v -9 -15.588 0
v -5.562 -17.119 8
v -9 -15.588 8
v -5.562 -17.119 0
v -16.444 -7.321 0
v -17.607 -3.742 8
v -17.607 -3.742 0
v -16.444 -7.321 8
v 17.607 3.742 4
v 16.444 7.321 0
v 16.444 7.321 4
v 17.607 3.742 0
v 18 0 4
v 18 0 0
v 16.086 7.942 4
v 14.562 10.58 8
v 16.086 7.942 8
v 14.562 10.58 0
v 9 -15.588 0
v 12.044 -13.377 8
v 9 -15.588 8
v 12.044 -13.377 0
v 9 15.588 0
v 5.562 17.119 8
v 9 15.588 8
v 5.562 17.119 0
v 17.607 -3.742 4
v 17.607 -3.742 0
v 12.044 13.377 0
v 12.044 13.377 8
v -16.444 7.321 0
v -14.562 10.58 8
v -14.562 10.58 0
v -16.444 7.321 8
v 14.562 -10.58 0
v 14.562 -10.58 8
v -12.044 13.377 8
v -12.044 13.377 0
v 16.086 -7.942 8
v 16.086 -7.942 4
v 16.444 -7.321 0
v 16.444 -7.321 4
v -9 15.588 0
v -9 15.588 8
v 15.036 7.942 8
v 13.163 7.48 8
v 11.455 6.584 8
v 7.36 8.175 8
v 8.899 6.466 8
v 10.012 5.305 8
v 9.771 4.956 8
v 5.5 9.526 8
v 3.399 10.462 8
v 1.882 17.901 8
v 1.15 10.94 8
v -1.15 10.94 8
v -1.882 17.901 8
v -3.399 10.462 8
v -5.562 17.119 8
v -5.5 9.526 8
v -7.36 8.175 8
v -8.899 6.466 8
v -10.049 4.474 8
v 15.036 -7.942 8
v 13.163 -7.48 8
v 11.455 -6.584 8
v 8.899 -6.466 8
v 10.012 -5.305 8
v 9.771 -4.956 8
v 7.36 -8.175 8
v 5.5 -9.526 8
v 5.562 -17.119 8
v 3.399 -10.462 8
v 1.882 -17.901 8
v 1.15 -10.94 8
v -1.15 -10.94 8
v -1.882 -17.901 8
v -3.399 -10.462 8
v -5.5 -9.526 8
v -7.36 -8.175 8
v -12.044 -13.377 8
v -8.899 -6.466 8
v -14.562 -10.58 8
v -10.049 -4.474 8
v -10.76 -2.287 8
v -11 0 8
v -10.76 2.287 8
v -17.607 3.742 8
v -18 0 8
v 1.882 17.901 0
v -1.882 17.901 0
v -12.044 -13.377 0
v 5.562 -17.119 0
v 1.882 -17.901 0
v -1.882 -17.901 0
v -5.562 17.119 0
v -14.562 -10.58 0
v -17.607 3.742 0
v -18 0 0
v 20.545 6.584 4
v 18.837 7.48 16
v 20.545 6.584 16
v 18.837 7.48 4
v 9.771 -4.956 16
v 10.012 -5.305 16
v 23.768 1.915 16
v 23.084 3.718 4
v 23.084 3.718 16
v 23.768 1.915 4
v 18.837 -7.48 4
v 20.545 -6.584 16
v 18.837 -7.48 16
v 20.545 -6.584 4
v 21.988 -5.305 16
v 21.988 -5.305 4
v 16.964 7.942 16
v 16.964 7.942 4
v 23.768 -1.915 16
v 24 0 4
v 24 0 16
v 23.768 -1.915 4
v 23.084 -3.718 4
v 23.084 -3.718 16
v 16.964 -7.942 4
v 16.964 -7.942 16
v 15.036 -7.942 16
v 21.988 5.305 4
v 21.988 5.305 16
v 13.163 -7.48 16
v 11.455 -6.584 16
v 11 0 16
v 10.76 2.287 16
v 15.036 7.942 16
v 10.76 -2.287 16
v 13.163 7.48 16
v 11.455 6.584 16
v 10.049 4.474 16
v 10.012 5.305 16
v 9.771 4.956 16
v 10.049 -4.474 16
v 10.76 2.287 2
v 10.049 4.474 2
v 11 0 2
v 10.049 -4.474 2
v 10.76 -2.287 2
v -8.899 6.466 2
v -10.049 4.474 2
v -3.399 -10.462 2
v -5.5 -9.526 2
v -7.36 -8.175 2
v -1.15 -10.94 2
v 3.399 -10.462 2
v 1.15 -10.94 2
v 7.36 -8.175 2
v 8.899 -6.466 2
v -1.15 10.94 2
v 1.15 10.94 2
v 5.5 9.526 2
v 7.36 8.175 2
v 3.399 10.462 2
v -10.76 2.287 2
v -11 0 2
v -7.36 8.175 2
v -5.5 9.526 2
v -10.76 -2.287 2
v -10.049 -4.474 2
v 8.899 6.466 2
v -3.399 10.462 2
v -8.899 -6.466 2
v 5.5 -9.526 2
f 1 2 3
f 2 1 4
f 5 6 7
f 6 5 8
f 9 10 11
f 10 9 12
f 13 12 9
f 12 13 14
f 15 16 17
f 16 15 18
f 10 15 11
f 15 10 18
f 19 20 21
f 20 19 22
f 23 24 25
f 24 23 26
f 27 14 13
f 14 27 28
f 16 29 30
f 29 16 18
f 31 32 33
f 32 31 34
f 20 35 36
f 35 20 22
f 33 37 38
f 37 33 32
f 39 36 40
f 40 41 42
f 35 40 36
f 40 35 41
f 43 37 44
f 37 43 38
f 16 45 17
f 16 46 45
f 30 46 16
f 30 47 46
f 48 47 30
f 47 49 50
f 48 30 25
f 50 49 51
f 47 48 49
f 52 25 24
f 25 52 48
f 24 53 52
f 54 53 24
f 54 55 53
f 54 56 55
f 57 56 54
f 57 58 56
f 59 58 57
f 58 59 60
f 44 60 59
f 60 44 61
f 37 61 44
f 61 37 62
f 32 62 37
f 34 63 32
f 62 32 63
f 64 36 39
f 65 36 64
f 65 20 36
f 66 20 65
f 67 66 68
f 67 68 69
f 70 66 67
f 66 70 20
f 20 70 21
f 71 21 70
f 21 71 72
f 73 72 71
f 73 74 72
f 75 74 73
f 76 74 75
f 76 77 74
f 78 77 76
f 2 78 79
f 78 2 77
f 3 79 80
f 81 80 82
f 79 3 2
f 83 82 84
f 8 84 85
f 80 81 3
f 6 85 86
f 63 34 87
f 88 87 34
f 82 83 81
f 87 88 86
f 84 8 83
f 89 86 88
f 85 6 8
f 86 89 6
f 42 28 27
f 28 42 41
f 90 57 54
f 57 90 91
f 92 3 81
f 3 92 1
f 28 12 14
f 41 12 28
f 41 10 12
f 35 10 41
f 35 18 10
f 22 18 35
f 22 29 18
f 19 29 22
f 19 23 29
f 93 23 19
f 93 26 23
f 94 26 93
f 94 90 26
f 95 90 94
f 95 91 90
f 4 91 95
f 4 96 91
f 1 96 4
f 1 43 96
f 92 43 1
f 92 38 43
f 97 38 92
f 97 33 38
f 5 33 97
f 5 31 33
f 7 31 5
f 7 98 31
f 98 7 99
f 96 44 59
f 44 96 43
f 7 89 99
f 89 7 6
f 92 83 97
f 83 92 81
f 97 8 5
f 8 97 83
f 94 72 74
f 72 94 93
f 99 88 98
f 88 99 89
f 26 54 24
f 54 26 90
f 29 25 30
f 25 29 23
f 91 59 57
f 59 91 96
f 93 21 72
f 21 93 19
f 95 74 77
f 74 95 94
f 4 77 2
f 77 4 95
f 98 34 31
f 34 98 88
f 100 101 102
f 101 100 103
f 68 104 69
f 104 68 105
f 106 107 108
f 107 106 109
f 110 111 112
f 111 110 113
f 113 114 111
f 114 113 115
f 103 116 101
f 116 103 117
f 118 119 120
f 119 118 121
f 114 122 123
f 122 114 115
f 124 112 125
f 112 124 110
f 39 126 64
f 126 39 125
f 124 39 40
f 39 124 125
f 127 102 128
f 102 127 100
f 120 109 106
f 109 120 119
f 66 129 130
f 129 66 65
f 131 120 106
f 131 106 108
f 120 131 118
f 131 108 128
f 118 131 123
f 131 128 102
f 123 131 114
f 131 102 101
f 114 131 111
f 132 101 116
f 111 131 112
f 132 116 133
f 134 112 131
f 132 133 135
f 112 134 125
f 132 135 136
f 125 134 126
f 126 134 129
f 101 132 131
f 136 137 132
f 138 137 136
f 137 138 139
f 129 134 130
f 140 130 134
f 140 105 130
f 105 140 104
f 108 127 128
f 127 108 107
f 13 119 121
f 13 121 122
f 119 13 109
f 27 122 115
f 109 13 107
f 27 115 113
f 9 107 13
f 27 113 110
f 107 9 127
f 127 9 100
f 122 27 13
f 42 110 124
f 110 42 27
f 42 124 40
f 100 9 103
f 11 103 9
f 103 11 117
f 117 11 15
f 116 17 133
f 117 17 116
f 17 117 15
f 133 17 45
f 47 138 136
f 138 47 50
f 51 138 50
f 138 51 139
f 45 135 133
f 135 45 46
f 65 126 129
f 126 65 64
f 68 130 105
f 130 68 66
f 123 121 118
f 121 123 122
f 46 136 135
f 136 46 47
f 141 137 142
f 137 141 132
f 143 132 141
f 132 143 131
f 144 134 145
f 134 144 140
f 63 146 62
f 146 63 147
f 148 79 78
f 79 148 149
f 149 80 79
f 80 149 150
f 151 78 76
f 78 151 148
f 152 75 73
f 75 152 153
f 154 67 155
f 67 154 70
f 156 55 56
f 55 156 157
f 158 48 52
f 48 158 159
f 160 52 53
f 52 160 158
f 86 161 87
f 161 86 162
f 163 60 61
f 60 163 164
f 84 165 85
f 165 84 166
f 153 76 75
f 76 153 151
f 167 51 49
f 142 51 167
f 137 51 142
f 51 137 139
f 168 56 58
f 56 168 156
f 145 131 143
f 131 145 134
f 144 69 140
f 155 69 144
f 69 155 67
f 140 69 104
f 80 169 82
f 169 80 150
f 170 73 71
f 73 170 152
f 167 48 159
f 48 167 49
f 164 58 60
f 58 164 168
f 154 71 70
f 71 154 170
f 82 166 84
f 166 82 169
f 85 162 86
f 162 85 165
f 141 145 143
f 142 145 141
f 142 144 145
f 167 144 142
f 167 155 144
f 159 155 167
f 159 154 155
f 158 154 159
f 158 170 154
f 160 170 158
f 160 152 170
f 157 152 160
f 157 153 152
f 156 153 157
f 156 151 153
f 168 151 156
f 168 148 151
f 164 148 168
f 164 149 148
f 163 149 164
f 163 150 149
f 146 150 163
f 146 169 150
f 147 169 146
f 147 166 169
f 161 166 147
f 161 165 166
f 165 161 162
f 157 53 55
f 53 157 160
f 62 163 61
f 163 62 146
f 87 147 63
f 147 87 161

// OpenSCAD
// @language openscad-viewer/brep-1
// Internal diagnostic: node --import tsx scripts/check-brep-semantic.mjs examples/brep/semantic-enclosure.brep.scad
// The permanent browser/MCP brep-1 provider is not yet available.
difference() {
  union() {
    cylinder(r=18, h=8);
    translate([16,0,4]) cylinder(r=8, h=12);
  }
  translate([0,0,2]) cylinder(r=11, h=16);
}
